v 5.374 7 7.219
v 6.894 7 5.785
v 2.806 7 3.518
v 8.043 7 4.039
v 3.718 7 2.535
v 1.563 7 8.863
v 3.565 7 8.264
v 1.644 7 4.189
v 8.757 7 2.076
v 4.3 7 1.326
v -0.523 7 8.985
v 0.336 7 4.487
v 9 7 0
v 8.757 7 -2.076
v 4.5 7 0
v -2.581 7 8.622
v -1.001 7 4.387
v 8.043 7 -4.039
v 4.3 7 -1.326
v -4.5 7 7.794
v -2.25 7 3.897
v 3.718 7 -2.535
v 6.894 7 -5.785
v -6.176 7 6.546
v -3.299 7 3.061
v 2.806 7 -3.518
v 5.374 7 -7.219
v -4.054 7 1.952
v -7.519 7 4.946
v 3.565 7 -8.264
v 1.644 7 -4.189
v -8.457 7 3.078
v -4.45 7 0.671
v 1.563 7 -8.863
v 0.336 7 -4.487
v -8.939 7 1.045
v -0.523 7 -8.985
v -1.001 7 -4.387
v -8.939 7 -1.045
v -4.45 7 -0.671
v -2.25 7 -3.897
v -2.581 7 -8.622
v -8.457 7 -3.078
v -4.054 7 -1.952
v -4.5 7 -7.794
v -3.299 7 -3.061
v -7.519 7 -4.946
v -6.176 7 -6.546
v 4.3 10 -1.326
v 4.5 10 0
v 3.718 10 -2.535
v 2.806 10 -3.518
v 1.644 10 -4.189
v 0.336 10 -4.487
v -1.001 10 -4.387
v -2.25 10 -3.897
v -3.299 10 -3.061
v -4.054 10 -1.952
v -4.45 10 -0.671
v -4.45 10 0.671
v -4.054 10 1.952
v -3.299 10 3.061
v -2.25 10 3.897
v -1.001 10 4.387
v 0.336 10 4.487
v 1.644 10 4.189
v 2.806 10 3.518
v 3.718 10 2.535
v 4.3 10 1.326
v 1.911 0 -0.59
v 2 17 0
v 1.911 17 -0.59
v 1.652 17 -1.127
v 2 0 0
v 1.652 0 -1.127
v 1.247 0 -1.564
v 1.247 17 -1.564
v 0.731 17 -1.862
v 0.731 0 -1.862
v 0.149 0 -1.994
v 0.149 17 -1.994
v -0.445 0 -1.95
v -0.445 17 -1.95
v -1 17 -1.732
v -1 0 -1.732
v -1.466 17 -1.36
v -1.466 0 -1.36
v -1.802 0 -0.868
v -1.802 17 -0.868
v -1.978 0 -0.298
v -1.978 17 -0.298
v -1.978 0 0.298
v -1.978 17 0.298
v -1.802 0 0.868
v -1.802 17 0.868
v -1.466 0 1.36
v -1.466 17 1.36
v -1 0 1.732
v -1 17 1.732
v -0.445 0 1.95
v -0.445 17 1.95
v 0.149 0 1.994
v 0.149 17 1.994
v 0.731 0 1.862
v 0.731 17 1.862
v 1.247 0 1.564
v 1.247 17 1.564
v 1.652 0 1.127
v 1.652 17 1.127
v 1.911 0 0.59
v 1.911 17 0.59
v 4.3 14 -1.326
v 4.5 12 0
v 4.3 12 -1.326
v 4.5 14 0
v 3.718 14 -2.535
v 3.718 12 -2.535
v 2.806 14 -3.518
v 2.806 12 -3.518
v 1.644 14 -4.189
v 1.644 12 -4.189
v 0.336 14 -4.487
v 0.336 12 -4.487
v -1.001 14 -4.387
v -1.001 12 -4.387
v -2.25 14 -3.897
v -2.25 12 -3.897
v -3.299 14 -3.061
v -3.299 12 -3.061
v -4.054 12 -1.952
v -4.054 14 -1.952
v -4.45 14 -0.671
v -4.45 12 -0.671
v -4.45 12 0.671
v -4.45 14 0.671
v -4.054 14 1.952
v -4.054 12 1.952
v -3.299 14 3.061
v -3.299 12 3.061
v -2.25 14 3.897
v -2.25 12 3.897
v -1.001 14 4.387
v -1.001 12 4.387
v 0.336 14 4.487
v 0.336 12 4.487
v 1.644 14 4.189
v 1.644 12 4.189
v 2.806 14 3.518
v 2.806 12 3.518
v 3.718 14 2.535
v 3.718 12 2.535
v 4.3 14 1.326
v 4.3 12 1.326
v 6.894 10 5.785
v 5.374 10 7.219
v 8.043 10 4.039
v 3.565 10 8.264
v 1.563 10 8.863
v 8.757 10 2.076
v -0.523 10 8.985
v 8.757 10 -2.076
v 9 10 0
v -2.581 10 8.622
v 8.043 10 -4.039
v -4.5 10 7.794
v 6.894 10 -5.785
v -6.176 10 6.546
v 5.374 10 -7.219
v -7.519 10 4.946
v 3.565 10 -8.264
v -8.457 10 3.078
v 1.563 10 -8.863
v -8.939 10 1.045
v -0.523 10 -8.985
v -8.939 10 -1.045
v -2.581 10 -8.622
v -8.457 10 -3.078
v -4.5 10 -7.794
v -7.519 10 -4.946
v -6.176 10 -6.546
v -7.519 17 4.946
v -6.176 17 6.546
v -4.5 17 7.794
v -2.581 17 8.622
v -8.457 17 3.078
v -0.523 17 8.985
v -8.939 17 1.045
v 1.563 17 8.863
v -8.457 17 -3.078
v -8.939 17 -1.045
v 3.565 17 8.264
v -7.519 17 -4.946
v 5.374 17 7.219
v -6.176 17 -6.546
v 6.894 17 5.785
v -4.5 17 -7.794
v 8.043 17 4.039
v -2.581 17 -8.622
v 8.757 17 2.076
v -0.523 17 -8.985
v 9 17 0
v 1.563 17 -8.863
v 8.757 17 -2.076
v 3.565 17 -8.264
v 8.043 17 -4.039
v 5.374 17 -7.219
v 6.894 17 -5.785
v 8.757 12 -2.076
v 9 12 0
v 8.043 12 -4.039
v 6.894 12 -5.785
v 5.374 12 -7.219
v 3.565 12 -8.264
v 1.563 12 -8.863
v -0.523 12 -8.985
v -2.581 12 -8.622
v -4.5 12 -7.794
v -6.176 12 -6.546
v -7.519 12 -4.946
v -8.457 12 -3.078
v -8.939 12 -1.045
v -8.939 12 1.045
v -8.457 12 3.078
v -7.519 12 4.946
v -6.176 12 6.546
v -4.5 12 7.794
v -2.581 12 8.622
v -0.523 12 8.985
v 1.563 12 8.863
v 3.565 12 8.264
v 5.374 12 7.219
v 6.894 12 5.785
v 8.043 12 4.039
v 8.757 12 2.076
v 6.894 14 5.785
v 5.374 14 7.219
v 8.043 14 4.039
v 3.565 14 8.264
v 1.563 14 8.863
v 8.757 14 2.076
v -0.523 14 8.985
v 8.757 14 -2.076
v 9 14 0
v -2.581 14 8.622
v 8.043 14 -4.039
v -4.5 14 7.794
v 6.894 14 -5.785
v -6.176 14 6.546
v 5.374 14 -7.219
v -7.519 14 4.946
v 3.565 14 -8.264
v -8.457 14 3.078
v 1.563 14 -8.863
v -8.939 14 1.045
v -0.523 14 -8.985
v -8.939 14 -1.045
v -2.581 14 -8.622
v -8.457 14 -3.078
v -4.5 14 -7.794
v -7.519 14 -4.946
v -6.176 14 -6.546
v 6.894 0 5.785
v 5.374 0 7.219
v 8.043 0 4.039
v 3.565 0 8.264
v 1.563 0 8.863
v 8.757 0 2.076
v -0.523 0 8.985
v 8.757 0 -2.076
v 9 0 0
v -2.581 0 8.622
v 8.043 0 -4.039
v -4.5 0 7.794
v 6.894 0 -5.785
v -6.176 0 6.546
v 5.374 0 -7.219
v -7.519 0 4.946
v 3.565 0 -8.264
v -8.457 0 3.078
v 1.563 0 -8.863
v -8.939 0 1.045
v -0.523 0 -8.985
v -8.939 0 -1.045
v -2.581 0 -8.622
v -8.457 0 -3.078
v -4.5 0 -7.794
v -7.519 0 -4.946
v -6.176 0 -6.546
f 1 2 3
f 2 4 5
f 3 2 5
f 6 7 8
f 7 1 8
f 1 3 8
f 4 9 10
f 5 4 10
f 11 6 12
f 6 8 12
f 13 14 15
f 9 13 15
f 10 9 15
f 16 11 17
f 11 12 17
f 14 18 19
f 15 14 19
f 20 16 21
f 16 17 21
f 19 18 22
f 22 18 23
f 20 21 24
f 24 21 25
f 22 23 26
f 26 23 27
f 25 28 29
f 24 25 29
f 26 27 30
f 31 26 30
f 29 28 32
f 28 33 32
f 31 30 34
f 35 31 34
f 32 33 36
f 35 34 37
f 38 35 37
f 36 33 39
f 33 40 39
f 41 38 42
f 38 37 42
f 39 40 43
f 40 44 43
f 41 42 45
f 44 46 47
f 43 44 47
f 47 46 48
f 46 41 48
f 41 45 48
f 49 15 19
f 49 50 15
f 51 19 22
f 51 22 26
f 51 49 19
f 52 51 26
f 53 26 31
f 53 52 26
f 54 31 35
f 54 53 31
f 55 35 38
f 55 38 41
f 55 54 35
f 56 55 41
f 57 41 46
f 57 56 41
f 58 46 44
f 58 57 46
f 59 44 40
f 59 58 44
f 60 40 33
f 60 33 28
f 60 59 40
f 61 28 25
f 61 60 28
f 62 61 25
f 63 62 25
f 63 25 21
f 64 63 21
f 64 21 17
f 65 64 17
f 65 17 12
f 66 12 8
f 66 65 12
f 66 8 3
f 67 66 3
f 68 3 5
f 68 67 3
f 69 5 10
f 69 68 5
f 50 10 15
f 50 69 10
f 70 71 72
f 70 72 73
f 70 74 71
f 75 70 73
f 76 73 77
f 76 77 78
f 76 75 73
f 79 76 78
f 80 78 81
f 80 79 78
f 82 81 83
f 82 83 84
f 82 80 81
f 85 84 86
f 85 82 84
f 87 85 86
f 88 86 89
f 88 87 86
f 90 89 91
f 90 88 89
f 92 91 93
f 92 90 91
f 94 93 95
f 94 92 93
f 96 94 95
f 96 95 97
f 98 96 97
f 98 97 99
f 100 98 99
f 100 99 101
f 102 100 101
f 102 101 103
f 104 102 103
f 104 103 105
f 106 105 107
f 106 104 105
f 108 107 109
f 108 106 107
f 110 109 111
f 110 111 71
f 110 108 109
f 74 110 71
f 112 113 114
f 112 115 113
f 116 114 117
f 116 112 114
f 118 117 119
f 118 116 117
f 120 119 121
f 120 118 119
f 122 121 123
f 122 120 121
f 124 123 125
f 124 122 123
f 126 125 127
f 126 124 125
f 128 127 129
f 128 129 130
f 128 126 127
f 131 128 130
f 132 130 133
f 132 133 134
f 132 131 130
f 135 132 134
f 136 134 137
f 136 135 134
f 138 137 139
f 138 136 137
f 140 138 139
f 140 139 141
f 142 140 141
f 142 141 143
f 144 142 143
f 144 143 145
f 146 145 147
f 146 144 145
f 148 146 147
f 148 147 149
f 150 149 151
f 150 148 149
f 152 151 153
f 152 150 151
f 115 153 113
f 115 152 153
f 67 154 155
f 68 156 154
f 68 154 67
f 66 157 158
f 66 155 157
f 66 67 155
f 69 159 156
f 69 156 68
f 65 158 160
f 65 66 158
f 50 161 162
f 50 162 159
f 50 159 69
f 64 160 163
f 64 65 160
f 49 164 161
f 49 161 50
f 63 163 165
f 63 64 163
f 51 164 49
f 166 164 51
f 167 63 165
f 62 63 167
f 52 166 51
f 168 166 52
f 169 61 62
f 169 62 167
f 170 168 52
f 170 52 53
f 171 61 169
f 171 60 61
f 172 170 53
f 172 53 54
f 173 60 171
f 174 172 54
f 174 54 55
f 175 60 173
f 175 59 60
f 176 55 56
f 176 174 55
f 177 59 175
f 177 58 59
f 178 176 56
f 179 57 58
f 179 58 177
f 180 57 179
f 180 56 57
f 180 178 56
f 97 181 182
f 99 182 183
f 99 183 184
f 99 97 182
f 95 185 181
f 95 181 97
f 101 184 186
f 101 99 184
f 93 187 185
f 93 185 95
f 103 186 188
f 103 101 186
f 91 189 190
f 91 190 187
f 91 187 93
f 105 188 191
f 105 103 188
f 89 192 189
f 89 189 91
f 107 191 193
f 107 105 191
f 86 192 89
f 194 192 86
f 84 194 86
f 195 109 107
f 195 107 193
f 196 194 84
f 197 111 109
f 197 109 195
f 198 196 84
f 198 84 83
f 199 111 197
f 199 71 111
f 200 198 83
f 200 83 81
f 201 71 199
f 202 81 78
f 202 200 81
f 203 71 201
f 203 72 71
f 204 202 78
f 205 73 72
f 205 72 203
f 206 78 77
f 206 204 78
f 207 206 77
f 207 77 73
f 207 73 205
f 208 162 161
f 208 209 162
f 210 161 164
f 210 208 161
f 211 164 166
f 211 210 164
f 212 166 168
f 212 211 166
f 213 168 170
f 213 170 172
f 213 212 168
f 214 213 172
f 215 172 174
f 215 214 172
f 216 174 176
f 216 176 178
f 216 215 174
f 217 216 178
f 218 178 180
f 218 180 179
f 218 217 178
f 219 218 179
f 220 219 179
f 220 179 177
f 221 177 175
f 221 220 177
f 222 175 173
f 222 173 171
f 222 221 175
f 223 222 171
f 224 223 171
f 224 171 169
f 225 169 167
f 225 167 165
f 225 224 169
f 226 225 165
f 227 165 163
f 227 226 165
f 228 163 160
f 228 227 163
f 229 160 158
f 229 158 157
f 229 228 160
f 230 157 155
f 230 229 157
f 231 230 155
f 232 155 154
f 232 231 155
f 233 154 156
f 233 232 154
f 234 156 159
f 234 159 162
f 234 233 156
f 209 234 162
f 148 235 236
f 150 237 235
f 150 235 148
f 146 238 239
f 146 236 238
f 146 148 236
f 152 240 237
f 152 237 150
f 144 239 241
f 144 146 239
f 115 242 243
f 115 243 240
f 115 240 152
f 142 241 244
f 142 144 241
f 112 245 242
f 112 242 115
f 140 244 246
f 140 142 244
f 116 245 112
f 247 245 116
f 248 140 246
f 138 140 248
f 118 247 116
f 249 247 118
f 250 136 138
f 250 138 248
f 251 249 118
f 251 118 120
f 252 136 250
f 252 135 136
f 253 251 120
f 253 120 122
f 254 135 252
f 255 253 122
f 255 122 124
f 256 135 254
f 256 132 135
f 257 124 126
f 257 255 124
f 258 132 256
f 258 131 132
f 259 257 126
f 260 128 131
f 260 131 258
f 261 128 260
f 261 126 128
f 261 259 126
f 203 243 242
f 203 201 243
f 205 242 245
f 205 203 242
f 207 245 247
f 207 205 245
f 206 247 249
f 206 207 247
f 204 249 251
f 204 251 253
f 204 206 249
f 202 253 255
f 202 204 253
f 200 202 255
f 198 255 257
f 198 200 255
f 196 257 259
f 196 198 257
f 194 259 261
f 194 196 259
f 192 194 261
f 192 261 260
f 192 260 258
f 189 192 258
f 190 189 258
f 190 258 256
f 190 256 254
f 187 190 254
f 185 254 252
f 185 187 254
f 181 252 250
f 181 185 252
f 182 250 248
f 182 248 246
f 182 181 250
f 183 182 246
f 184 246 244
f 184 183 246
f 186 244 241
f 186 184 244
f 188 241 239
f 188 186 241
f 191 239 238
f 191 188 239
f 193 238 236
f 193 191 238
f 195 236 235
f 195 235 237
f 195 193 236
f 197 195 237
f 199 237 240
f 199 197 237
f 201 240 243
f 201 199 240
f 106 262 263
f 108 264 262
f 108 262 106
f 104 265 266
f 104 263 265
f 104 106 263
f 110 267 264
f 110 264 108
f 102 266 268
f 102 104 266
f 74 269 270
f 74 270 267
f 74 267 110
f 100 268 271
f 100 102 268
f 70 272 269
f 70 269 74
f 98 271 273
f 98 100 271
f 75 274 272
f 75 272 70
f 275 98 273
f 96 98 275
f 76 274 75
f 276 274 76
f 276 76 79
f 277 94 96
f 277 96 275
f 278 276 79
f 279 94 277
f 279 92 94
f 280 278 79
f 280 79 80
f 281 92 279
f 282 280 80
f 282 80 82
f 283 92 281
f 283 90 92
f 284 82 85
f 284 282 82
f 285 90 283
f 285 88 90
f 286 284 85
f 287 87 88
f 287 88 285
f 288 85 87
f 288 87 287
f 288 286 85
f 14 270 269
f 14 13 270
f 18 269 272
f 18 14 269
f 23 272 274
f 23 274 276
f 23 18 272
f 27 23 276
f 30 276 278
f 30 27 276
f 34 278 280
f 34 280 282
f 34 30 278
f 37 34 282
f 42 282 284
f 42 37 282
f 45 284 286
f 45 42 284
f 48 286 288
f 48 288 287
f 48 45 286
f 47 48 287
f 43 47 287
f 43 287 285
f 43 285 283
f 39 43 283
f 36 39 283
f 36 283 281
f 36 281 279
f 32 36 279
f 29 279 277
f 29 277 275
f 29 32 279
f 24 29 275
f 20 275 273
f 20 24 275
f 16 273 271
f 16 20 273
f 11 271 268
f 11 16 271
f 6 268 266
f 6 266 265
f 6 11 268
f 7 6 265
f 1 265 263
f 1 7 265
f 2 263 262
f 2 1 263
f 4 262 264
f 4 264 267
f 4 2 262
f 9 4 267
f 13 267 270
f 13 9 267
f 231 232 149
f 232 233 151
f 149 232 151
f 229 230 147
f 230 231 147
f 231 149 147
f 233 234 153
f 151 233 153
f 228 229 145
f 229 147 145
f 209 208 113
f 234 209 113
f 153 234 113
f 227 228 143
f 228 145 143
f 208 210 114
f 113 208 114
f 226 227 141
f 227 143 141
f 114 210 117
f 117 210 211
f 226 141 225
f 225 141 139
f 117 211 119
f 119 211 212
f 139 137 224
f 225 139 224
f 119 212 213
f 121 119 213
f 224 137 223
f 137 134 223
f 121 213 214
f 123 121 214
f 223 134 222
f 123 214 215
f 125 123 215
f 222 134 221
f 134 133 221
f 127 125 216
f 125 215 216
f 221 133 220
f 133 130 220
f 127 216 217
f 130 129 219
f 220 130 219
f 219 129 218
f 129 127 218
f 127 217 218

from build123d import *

# Parameters (mm, degrees)
SKETCH1_W   = 6.5
SKETCH1_H   = 3
SKETCH1_H_2 = 2
SKETCH1_H_3 = 7
SKETCH1_W_2 = 2


with BuildPart() as part:
    # Sketch1 → Revolve1 (revolve)
    with BuildSketch(Plane.XY):
        Polygon((2, 0), (2.5, 0), (2.5, 7), (2.5, 10), (2.5, 12), (2.5, 14), (2.5, 17), (2, 17), align=None)
        with Locations((5.75, 15.5)):
            Rectangle(SKETCH1_W, SKETCH1_H)
        with Locations((5.75, 11)):
            Rectangle(SKETCH1_W, SKETCH1_H_2)
        with Locations((5.75, 3.5)):
            Rectangle(SKETCH1_W, SKETCH1_H_3)
        with Locations((3.5, 8.5)):
            Rectangle(SKETCH1_W_2, SKETCH1_H)
        with Locations((3.5, 13)):
            Rectangle(SKETCH1_W_2, SKETCH1_H_2)
    revolve(axis=Axis((0, 0, 0), (0, 1, 0)))


solid = part.part
